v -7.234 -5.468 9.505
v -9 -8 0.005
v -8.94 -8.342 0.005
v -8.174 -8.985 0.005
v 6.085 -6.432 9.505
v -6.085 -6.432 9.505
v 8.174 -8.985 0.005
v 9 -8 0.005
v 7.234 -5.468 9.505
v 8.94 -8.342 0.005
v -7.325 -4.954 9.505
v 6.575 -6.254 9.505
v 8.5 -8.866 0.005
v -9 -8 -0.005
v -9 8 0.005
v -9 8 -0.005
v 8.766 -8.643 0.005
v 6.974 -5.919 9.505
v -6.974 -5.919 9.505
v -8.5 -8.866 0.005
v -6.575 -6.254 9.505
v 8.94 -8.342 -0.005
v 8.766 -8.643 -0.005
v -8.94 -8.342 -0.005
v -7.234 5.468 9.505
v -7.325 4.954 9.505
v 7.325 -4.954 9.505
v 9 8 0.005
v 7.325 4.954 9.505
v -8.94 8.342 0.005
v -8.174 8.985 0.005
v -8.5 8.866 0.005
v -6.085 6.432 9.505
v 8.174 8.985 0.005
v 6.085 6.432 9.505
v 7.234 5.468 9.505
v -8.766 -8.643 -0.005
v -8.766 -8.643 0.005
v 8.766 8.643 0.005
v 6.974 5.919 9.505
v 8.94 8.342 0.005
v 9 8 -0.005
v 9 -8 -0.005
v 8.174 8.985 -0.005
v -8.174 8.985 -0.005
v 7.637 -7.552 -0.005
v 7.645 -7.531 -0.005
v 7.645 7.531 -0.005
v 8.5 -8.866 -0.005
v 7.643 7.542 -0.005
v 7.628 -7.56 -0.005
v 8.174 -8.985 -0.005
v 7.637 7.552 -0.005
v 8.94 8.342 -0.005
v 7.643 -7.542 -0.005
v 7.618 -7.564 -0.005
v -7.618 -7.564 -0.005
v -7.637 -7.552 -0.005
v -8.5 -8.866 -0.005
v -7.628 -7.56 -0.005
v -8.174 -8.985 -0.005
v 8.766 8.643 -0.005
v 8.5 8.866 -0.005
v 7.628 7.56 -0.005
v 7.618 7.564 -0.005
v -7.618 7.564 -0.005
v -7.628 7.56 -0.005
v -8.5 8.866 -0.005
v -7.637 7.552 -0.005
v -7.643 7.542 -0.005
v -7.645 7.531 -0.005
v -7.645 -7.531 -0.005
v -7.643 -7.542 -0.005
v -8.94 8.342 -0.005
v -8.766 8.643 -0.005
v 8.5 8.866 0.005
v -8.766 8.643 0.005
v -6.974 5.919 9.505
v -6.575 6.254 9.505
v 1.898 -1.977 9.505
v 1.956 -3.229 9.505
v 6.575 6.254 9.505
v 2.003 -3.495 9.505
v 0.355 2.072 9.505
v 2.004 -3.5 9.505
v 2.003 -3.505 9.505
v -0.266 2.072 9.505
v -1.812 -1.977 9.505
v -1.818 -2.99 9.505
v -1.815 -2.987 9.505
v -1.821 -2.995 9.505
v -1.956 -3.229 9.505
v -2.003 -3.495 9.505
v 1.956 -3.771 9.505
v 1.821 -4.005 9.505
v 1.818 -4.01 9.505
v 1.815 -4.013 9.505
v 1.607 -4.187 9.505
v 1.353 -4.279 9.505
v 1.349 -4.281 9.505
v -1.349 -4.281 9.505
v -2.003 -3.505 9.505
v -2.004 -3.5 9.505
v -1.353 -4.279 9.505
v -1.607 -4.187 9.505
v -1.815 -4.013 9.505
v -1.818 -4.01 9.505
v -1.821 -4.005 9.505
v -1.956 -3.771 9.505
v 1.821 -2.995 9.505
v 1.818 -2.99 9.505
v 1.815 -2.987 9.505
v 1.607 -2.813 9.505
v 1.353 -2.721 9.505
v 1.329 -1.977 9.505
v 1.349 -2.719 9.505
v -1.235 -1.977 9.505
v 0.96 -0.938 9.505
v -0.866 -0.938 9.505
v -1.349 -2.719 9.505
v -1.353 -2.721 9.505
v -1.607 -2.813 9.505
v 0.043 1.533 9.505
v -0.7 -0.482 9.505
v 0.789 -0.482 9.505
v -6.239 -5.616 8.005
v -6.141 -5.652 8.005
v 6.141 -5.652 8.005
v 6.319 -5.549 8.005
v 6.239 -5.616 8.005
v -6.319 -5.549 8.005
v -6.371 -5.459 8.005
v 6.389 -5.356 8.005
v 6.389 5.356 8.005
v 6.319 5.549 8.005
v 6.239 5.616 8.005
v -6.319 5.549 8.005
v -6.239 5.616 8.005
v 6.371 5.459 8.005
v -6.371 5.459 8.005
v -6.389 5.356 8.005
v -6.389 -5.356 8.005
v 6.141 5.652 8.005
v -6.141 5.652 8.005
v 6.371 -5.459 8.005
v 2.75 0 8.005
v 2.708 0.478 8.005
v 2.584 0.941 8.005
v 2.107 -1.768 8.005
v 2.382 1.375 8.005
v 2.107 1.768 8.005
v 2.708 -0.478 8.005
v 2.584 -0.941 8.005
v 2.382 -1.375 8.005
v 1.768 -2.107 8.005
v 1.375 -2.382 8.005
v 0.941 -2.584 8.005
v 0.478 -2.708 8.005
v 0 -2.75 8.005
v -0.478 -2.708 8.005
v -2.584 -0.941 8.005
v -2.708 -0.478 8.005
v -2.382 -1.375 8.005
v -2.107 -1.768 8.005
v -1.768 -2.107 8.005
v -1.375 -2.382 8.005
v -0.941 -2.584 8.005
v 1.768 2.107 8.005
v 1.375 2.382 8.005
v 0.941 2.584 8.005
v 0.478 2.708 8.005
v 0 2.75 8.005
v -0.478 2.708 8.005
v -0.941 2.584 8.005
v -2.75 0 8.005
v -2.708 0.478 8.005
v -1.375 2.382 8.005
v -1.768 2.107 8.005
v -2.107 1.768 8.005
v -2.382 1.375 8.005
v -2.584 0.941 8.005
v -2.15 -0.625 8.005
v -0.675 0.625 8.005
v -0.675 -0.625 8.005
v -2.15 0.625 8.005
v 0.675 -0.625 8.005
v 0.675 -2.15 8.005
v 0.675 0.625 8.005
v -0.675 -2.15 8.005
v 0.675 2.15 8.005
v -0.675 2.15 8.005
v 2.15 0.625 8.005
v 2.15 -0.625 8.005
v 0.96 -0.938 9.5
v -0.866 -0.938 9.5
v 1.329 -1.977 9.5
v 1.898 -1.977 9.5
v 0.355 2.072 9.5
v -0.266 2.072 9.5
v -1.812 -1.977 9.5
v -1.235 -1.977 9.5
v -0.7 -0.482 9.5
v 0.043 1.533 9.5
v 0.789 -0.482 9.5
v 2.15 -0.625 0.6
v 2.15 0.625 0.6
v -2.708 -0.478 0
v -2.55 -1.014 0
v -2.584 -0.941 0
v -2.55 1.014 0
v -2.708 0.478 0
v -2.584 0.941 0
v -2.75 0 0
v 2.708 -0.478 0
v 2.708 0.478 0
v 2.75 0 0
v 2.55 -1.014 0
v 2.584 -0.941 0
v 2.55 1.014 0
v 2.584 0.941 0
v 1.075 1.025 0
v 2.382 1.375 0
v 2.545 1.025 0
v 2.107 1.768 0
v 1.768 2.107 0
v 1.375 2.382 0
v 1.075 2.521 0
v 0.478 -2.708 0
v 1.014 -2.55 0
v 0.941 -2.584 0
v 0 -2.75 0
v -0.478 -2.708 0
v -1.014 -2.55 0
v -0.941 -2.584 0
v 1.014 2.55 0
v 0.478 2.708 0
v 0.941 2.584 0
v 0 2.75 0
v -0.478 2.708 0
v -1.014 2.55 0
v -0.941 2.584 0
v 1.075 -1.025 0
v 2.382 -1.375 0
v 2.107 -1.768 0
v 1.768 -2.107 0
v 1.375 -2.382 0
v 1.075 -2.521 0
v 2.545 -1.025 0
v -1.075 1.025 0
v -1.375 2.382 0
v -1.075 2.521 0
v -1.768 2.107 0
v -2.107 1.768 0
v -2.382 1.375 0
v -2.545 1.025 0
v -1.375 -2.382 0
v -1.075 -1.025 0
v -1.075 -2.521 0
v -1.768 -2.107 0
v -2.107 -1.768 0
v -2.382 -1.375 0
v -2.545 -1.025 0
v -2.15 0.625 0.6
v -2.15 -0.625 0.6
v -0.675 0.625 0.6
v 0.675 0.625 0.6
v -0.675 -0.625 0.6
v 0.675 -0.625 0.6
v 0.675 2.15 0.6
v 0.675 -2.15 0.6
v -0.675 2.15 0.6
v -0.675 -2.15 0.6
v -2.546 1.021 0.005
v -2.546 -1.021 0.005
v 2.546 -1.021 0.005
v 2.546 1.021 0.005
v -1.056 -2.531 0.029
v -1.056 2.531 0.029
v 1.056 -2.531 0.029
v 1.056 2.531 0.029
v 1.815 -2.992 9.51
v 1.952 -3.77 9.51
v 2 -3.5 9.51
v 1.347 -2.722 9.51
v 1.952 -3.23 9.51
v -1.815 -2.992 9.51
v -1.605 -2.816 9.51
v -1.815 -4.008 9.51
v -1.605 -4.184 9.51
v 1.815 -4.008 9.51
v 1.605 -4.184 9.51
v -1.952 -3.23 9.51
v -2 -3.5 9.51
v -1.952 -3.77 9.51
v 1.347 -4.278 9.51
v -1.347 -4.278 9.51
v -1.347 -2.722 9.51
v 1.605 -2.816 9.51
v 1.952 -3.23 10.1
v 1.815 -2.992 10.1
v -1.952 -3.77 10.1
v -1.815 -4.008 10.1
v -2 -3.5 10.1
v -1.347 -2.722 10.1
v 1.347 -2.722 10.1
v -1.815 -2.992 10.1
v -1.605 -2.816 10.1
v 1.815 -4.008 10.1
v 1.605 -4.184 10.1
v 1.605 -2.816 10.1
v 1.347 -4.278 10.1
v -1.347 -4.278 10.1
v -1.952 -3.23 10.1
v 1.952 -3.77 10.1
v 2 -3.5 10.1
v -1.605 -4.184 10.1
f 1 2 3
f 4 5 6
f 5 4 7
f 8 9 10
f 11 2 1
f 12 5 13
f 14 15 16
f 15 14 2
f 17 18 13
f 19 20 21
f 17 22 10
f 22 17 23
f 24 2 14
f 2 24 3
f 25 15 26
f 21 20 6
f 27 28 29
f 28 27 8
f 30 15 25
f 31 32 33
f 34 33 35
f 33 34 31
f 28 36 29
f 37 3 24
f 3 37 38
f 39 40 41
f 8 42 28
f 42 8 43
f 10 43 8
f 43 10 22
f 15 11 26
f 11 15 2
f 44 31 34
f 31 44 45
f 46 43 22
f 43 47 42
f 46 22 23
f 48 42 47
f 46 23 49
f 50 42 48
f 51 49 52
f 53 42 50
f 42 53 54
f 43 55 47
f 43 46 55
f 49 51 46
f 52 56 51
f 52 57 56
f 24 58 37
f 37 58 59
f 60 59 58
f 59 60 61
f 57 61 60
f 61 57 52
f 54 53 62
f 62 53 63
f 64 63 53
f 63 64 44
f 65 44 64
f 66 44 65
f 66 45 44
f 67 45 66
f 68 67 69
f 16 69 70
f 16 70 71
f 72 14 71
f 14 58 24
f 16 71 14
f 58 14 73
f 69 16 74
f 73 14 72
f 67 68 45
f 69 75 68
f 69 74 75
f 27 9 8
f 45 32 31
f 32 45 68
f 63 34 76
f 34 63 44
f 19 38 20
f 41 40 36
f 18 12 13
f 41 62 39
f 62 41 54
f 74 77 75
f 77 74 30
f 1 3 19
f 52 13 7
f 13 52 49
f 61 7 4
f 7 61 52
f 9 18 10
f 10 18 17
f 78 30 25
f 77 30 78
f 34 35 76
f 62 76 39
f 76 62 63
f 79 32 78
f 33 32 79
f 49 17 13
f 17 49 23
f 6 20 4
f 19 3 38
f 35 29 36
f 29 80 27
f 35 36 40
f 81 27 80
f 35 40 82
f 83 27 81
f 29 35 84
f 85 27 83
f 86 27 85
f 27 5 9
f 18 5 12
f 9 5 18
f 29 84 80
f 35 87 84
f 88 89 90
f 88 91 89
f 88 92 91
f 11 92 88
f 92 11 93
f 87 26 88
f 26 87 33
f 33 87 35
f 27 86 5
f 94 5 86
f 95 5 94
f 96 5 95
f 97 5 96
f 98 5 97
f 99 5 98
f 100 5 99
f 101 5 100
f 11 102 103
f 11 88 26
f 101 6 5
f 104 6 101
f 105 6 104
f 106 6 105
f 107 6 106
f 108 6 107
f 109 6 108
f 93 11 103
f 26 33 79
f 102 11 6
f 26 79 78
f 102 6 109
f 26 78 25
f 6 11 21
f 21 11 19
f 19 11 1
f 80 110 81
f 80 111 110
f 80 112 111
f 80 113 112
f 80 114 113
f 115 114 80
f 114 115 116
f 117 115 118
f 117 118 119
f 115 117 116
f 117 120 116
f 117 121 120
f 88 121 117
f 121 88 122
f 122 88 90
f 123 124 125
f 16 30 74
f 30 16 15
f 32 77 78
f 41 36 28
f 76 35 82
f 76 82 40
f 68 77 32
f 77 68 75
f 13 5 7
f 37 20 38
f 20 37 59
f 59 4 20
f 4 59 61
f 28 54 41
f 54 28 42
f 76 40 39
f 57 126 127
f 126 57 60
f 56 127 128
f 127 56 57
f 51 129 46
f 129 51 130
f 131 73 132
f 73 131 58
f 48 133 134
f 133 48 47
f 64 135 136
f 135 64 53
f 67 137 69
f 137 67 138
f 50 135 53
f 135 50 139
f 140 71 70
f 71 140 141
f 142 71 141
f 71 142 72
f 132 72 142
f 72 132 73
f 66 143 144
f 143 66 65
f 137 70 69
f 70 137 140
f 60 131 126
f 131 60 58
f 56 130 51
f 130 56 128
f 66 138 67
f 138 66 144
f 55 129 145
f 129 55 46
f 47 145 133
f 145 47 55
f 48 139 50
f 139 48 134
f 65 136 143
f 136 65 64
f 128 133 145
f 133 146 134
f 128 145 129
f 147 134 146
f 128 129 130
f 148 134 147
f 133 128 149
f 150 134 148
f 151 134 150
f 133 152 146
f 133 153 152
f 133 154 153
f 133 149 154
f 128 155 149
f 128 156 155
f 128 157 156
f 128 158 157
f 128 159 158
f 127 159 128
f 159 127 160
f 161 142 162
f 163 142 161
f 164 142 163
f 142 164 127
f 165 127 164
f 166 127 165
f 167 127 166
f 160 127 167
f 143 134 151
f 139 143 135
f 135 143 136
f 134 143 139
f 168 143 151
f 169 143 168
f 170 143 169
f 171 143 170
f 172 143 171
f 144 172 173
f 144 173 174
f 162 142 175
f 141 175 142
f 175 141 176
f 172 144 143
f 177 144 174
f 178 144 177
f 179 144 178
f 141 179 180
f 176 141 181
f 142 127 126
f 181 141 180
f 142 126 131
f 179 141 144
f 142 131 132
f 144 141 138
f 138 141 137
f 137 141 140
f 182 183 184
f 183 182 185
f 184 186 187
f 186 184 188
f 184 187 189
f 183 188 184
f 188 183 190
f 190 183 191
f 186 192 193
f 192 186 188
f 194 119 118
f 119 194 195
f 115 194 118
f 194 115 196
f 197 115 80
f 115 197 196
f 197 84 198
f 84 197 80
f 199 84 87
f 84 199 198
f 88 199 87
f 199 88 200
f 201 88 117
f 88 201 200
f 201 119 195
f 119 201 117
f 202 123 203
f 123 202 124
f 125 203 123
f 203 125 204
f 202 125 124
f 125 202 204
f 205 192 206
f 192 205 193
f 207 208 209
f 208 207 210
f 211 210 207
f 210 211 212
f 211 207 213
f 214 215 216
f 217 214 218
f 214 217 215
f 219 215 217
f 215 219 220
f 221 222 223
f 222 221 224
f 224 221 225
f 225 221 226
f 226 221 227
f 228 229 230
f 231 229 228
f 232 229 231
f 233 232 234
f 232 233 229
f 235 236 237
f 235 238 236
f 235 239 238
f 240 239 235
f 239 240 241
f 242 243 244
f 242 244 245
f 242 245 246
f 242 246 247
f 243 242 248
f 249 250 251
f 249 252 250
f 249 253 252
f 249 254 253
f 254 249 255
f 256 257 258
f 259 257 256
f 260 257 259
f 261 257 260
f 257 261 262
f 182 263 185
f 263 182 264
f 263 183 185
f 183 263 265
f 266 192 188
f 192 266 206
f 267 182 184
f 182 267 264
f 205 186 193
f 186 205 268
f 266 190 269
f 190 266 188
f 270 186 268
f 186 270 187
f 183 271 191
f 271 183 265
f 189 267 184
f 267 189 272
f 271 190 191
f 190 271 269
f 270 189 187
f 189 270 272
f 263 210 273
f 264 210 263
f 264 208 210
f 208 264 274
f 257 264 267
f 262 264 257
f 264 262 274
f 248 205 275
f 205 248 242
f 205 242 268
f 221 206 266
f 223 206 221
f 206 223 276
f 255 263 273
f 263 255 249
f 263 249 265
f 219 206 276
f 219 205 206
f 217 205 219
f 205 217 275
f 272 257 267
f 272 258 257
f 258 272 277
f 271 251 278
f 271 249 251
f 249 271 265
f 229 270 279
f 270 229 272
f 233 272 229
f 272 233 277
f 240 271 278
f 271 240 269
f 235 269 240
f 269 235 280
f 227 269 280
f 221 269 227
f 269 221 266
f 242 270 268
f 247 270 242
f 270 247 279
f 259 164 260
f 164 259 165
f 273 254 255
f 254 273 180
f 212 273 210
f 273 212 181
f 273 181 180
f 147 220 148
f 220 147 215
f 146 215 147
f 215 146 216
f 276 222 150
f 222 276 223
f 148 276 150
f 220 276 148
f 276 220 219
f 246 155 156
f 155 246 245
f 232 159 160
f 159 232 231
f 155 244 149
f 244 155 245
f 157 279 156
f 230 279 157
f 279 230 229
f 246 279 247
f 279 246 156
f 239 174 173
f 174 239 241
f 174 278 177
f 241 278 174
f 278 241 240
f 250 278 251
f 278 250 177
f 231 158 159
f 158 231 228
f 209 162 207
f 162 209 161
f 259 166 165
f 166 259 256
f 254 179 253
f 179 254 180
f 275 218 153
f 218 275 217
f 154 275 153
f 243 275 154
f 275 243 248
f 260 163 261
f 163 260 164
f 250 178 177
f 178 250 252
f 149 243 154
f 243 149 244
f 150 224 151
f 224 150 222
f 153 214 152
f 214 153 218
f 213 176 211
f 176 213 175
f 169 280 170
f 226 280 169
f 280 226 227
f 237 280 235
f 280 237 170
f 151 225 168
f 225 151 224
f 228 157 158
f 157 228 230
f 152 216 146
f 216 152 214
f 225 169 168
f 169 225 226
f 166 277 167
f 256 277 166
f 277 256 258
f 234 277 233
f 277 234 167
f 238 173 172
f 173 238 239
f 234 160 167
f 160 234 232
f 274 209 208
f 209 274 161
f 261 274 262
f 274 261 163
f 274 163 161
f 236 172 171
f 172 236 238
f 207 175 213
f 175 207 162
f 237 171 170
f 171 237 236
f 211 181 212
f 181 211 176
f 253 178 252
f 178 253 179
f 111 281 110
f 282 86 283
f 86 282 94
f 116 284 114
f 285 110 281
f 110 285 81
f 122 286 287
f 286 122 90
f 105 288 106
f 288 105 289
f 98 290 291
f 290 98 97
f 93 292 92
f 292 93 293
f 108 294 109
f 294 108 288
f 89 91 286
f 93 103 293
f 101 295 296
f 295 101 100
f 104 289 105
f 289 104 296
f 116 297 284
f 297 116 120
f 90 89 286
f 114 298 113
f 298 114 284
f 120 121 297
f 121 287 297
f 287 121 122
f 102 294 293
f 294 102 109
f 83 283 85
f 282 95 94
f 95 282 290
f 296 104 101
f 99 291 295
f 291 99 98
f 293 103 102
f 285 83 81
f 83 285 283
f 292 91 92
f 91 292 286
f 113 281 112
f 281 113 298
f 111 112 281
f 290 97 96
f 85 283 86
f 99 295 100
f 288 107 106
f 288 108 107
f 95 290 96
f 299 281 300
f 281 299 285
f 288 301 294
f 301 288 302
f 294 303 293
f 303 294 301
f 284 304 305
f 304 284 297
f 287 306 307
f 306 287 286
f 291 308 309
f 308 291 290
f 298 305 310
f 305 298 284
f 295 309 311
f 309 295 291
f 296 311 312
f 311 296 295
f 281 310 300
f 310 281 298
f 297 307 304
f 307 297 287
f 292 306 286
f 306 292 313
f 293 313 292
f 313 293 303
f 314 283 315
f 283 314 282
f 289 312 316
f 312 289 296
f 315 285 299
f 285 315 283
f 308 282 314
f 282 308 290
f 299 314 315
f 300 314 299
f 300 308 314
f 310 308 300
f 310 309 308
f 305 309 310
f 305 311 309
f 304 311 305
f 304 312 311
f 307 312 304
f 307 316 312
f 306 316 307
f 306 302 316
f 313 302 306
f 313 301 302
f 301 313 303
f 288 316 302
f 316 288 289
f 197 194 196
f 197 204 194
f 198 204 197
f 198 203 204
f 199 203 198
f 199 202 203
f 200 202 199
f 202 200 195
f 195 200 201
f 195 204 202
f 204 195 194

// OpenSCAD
// file: ../modules/homing_bar.scad
function homing_bar_quality_steps(quality, preview_steps, export_steps) =
    quality == "preview" ? preview_steps : export_steps;

module homing_bar_profile(length, width, quality = "export") {
    end_steps = homing_bar_quality_steps(quality, 18, 32);
    cap_length = max(length, width);

    hull() {
        translate([-cap_length / 2 + width / 2, 0])
            circle(d = width, $fn = end_steps);
        translate([ cap_length / 2 - width / 2, 0])
            circle(d = width, $fn = end_steps);
    }
}

module homing_bar_blank(
    length,
    width,
    height,
    base_thickness,
    offset_y,
    base_z,
    quality = "export"
) {
    cap_height = max(height, 0.05);
    contact_height = max(base_thickness, 0.05);
    contact_length = length + contact_height * 1.6;
    contact_width = width + contact_height * 1.2;

    translate([0, offset_y, base_z])
        union() {
            hull() {
                linear_extrude(height = 0.01)
                    homing_bar_profile(contact_length, contact_width, quality);
                translate([0, 0, contact_height])
                    linear_extrude(height = 0.01)
                        homing_bar_profile(length, width, quality);
            }

            translate([0, 0, contact_height])
                linear_extrude(height = cap_height)
                    homing_bar_profile(length, width, quality);
        }
}
// file: ../modules/stem_alps.scad
function positive_alps_stem_dimension(value, minimum = 0.1) = max(value, minimum);

module alps_post(stem_length, stem_width, stem_height, lead_in) {
    safe_length = positive_alps_stem_dimension(stem_length);
    safe_width = positive_alps_stem_dimension(stem_width);
    safe_height = max(stem_height, 0.2);
    safe_lead_in = min(lead_in, safe_length * 0.2, safe_width * 0.3, safe_height * 0.4);

    hull() {
        linear_extrude(height = max(safe_height - safe_lead_in, 0.01))
            square([safe_length, safe_width], center = true);

        translate([0, 0, safe_height - 0.01])
            linear_extrude(height = 0.01)
                square([
                    positive_alps_stem_dimension(safe_length - safe_lead_in * 2),
                    positive_alps_stem_dimension(safe_width - safe_lead_in * 2)
                ], center = true);
    }
}

module stem_alps(
    stem_length = 4.45,
    stem_width = 2.25,
    stem_height = 3.5,
    base_clearance = 0,
    lead_in = 0.12,
    quality = "export"
) {
    translate([0, 0, base_clearance])
        alps_post(stem_length, stem_width, stem_height, lead_in);
}
// file: ../modules/stem_choc_v2.scad
use <stem_mx.scad>

module stem_choc_v2(
    outer_diameter = 5.5,
    stem_height = 6.5,
    base_clearance = 0,
    cross_width_horizontal = 1.25,
    cross_length_horizontal = 4.3,
    cross_width_vertical = 1.35,
    cross_length_vertical = 4.3,
    cross_chamfer = 0.4,
    chamfer_height = 0.6,
    quality = "export"
) {
    stem_mx(
        outer_diameter = outer_diameter,
        stem_height = stem_height,
        base_clearance = base_clearance,
        cross_width_horizontal = cross_width_horizontal,
        cross_length_horizontal = cross_length_horizontal,
        cross_width_vertical = cross_width_vertical,
        cross_length_vertical = cross_length_vertical,
        cross_chamfer = cross_chamfer,
        chamfer_height = chamfer_height,
        quality = quality
    );
}
// file: ../modules/stem_choc_v1.scad
function positive_choc_stem_dimension(value, minimum = 0.1) = max(value, minimum);

module choc_v1_prong(prong_width, prong_depth, prong_height, lead_in) {
    safe_width = positive_choc_stem_dimension(prong_width);
    safe_depth = positive_choc_stem_dimension(prong_depth);
    safe_height = max(prong_height, 0.2);
    safe_lead_in = min(lead_in, safe_width * 0.4, safe_depth * 0.2, safe_height * 0.4);

    hull() {
        linear_extrude(height = max(safe_height - safe_lead_in, 0.01))
            square([safe_width, safe_depth], center = true);

        translate([0, 0, safe_height - 0.01])
            linear_extrude(height = 0.01)
                square([
                    positive_choc_stem_dimension(safe_width - safe_lead_in * 2),
                    positive_choc_stem_dimension(safe_depth - safe_lead_in * 2)
                ], center = true);
    }
}

module stem_choc_v1(
    prong_width = 1.2,
    prong_depth = 3.0,
    prong_spacing = 5.7,
    stem_height = 3.0,
    base_clearance = 0,
    lead_in = 0.12,
    quality = "export"
) {
    for (offset_x = [prong_spacing / 2, -prong_spacing / 2]) {
        translate([offset_x, 0, base_clearance])
            choc_v1_prong(prong_width, prong_depth, stem_height, lead_in);
    }
}
// file: ../modules/stem_mx.scad
function stem_quality_steps(quality, preview_steps, export_steps) =
    quality == "preview" ? preview_steps : export_steps;

module stem_slot(length, width, height) {
    translate([-length / 2, -width / 2, 0])
        cube([length, width, height]);
}

module stem_mx(
    outer_diameter = 5.5,
    stem_height = 4.5,
    base_clearance = 0,
    cross_width_horizontal = 1.25,
    cross_length_horizontal = 4.3,
    cross_width_vertical = 1.35,
    cross_length_vertical = 4.3,
    cross_chamfer = 0.4,
    chamfer_height = 0.6,
    quality = "export"
) {
    outer_steps = stem_quality_steps(quality, 36, 64);
    safe_height = max(stem_height, 0.2);

    difference() {
        translate([0, 0, base_clearance])
            cylinder(d = outer_diameter, h = safe_height, $fn = outer_steps);

        translate([0, 0, base_clearance]) {
            stem_slot(cross_length_horizontal, cross_width_horizontal, safe_height + 1);
            stem_slot(cross_width_vertical, cross_length_vertical, safe_height + 1);
        }

        if (cross_chamfer > 0) {
            translate([0, 0, base_clearance - 0.01])
                hull() {
                    stem_slot(
                        cross_length_horizontal + cross_chamfer * 2,
                        cross_width_horizontal + cross_chamfer * 2,
                        0.01
                    );
                    translate([0, 0, chamfer_height])
                        stem_slot(cross_length_horizontal, cross_width_horizontal, 0.01);
                }

            translate([0, 0, base_clearance - 0.01])
                hull() {
                    stem_slot(
                        cross_width_vertical + cross_chamfer * 2,
                        cross_length_vertical + cross_chamfer * 2,
                        0.01
                    );
                    translate([0, 0, chamfer_height])
                        stem_slot(cross_width_vertical, cross_length_vertical, 0.01);
                }
        }
    }
}
// file: ../modules/legend_block.scad
function legend_quality_steps(quality, preview_steps, export_steps) =
    quality == "preview" ? preview_steps : export_steps;
function legend_text_curve_steps(quality = "export") =
    legend_quality_steps(quality, 48, 96);
function legend_text_internal_scale(quality = "export") =
    legend_quality_steps(quality, 6, 10);
// Keep legend size tied to the user's explicit control value without auto-fitting by label length.
function legend_text_size(depth) = max(depth, 0);

module legend_text_shape(label, size, font_name, curve_steps = 48) {
    text(
        text = label,
        size = size,
        font = font_name,
        halign = "center",
        valign = "center",
        $fn = curve_steps
    );
}

// Keep decoration options available across bundled fonts without requiring extra font files.
module legend_text_profile(
    label,
    size,
    font_name,
    outline_delta = 0,
    curve_steps = 48
) {
    if (abs(outline_delta) > 0.0001) {
        offset(delta = outline_delta)
            legend_text_shape(
                label = label,
                size = size,
                font_name = font_name,
                curve_steps = curve_steps
            );
    } else {
        legend_text_shape(
            label = label,
            size = size,
            font_name = font_name,
            curve_steps = curve_steps
        );
    }
}

module legend_block(
    label,
    width,
    depth,
    height,
    offset_x,
    offset_y,
    base_z,
    font_name = "M PLUS 1:style=Regular",
    underline_enabled = false,
    underline_width = 0,
    underline_thickness = 0,
    underline_offset_y = 0,
    outline_delta = 0,
    quality = "export"
) {
    if (!is_undef(label) && len(label) > 0) {
        size = legend_text_size(depth);
        curve_steps = legend_text_curve_steps(quality);
        internal_scale = legend_text_internal_scale(quality);

        translate([offset_x, offset_y, base_z])
            linear_extrude(height = height, center = false, convexity = 10)
                // Build glyph outlines at a larger internal scale so the bundled runtime
                // preserves more of the original font curvature before scaling back down.
                scale([1 / internal_scale, 1 / internal_scale, 1])
                    union() {
                        legend_text_profile(
                            label = label,
                            size = size * internal_scale,
                            font_name = font_name,
                            outline_delta = outline_delta * internal_scale,
                            curve_steps = curve_steps
                        );

                        if (underline_enabled && underline_width > 0 && underline_thickness > 0) {
                            translate([0, underline_offset_y * internal_scale])
                                square(
                                    [underline_width * internal_scale, underline_thickness * internal_scale],
                                    center = true
                                );
                        }
                    }
    }
}
// file: ../modules/keycap_typewriter.scad
use <keycap_shell.scad>

function typewriter_plan_corner_radius(width, depth, radius) =
    min(max(radius, 0), max(min(width, depth), 0.2) / 2);
function typewriter_is_axis_aligned(pitch_deg, roll_deg) =
    abs(pitch_deg) <= 0.001 && abs(roll_deg) <= 0.001;

module keycap_typewriter_plan_profile(
    width,
    depth,
    corner_radius,
    quality = "export"
) {
    rounded_rect_coords(
        -width / 2,
        width / 2,
        -depth / 2,
        depth / 2,
        typewriter_plan_corner_radius(width, depth, corner_radius),
        quality
    );
}

module keycap_typewriter_outer_shell(
    width,
    depth,
    top_center_height,
    corner_radius,
    pitch_deg = 0,
    roll_deg = 0,
    quality = "export"
) {
    safe_corner_radius = typewriter_plan_corner_radius(width, depth, corner_radius);

    hull() {
        keycap_base_face(
            -width / 2,
            width / 2,
            -depth / 2,
            depth / 2,
            safe_corner_radius,
            quality
        );

        keycap_top_face(
            -width / 2,
            width / 2,
            -depth / 2,
            depth / 2,
            safe_corner_radius,
            top_center_height,
            pitch_deg,
            roll_deg,
            quality
        );
    }
}

module keycap_typewriter_cap(
    width,
    depth,
    top_center_height,
    corner_radius = 9,
    dish_radius = 45,
    dish_depth = 0,
    pitch_deg = 0,
    roll_deg = 0,
    quality = "export"
) {
    difference() {
        if (typewriter_is_axis_aligned(pitch_deg, roll_deg)) {
            linear_extrude(height = top_center_height)
                keycap_typewriter_plan_profile(
                    width = width,
                    depth = depth,
                    corner_radius = corner_radius,
                    quality = quality
                );
        } else {
            keycap_typewriter_outer_shell(
                width = width,
                depth = depth,
                top_center_height = top_center_height,
                corner_radius = corner_radius,
                pitch_deg = pitch_deg,
                roll_deg = roll_deg,
                quality = quality
            );
        }

        keycap_dish_cut(
            top_center_height = top_center_height,
            dish_depth = dish_depth,
            dish_radius = dish_radius,
            quality = quality
        );
    }
}

module keycap_typewriter_shell(
    width,
    depth,
    top_center_height,
    wall,
    top_thickness = 1.2,
    corner_radius = 9,
    dish_radius = 45,
    dish_depth = 0,
    pitch_deg = 0,
    roll_deg = 0,
    quality = "export"
) {
    keycap_typewriter_cap(
        width = width,
        depth = depth,
        top_center_height = top_center_height,
        corner_radius = corner_radius,
        dish_radius = dish_radius,
        dish_depth = dish_depth,
        pitch_deg = pitch_deg,
        roll_deg = roll_deg,
        quality = quality
    );
}
// file: ../presets/stem-nominals.scad
stem_nominal_outer_diameter = 5.5;
legacy_stem_nominal_width = stem_nominal_outer_diameter;
legacy_stem_nominal_depth = stem_nominal_outer_diameter;
stem_nominal_height = 6.5;
stem_nominal_inset = 0;
stem_nominal_cross_width_horizontal = 1.25;
stem_nominal_cross_length_horizontal = 4.3;
stem_nominal_cross_width_vertical = 1.35;
stem_nominal_cross_length_vertical = 4.3;
stem_nominal_cross_chamfer = 0.4;

stem_mx_nominal_outer_diameter = 5.5;
stem_mx_nominal_height = 4.5;
stem_mx_nominal_inset = 0;
stem_mx_nominal_cross_width_horizontal = stem_nominal_cross_width_horizontal;
stem_mx_nominal_cross_length_horizontal = stem_nominal_cross_length_horizontal;
stem_mx_nominal_cross_width_vertical = stem_nominal_cross_width_vertical;
stem_mx_nominal_cross_length_vertical = stem_nominal_cross_length_vertical;
stem_mx_nominal_cross_chamfer = stem_nominal_cross_chamfer;

stem_choc_v2_nominal_outer_diameter = stem_nominal_outer_diameter;
stem_choc_v2_nominal_height = stem_nominal_height;
stem_choc_v2_nominal_inset = stem_nominal_inset;
stem_choc_v2_nominal_cross_width_horizontal = stem_nominal_cross_width_horizontal;
stem_choc_v2_nominal_cross_length_horizontal = stem_nominal_cross_length_horizontal;
stem_choc_v2_nominal_cross_width_vertical = stem_nominal_cross_width_vertical;
stem_choc_v2_nominal_cross_length_vertical = stem_nominal_cross_length_vertical;
stem_choc_v2_nominal_cross_chamfer = stem_nominal_cross_chamfer;

stem_choc_v1_nominal_height = 3.0;
stem_choc_v1_nominal_inset = 0;
stem_choc_v1_nominal_prong_width = 1.2;
stem_choc_v1_nominal_prong_depth = 3.0;
stem_choc_v1_nominal_prong_spacing = 5.7;
stem_choc_v1_nominal_lead_in = 0.12;

stem_alps_nominal_height = 3.5;
stem_alps_nominal_inset = 0;
stem_alps_nominal_length = 4.45;
stem_alps_nominal_width = 2.25;
stem_alps_nominal_lead_in = 0.12;
// file: common/standard-1u-params.scad
user_shape_geometry_type = "shell";
user_key_width = 18;
user_key_depth = 18;
user_top_center_height = 9.5;
user_wall_thickness = 1.2;
user_top_scale = 0.84;
user_typewriter_corner_radius = 9;
user_profile_front_angle = 15;
user_profile_back_angle = 15;
user_profile_left_angle = 10;
user_profile_right_angle = 10;
user_top_thickness = 1.5;
user_bottom_corner_radius = 1.0;
user_top_corner_radius = 1.5;
user_dish_radius = 45;
user_dish_depth = 0;
user_top_pitch_deg = 0;
user_top_roll_deg = 0;

user_legend_enabled = true;
user_legend_text = "A";
user_legend_font_name = "M PLUS 1:style=Regular";
user_legend_underline_enabled = false;
user_legend_underline_width = 0;
user_legend_underline_thickness = 0;
user_legend_underline_offset_y = 0;
user_legend_width = 7.2;
user_legend_depth = 4.0;
user_legend_height = 0;
user_legend_embed = 0.6;
user_legend_outline_delta = 0;
user_legend_offset_x = 0;
user_legend_offset_y = 0;

user_homing_bar_enabled = false;
user_homing_bar_height = 0.6;
user_homing_bar_length = 4.0;
user_homing_bar_width = 1.58;
user_homing_bar_offset_y = -3.5;
user_homing_bar_base_thickness = 0.35;

user_stem_type = "choc_v2";
user_stem_enabled = true;
user_stem_outer_delta = 0;
user_stem_cross_margin = 0;
user_stem_inset_delta = 0;
// main file
export_target = "preview";
include <common/standard-1u-params.scad>

user_key_width = 18;
user_key_depth = 18;
user_top_center_height = 9.5;
user_top_pitch_deg = 0;
user_top_roll_deg = 0;
user_wall_thickness = 1.2;
user_top_scale = 0.84;
user_legend_enabled = true;
user_legend_text = "A";
user_legend_font_name = "M PLUS 1:style=Regular";
user_legend_underline_enabled = false;
user_legend_width = 7.2;
user_legend_depth = 4.0;
user_legend_height = 0;
user_legend_embed = 0.6;
user_legend_outline_delta = 0;
user_homing_bar_height = 0.6;
user_homing_bar_length = 4.0;
user_homing_bar_width = 1.58;
user_homing_bar_offset_y = -3.5;
user_homing_bar_base_thickness = 0.35;
user_stem_type = "choc_v2";
user_stem_outer_delta = 0;
user_stem_cross_margin = 0;
user_stem_inset_delta = 0;
user_homing_bar_enabled = true;

include <../base/keycap.scad>
